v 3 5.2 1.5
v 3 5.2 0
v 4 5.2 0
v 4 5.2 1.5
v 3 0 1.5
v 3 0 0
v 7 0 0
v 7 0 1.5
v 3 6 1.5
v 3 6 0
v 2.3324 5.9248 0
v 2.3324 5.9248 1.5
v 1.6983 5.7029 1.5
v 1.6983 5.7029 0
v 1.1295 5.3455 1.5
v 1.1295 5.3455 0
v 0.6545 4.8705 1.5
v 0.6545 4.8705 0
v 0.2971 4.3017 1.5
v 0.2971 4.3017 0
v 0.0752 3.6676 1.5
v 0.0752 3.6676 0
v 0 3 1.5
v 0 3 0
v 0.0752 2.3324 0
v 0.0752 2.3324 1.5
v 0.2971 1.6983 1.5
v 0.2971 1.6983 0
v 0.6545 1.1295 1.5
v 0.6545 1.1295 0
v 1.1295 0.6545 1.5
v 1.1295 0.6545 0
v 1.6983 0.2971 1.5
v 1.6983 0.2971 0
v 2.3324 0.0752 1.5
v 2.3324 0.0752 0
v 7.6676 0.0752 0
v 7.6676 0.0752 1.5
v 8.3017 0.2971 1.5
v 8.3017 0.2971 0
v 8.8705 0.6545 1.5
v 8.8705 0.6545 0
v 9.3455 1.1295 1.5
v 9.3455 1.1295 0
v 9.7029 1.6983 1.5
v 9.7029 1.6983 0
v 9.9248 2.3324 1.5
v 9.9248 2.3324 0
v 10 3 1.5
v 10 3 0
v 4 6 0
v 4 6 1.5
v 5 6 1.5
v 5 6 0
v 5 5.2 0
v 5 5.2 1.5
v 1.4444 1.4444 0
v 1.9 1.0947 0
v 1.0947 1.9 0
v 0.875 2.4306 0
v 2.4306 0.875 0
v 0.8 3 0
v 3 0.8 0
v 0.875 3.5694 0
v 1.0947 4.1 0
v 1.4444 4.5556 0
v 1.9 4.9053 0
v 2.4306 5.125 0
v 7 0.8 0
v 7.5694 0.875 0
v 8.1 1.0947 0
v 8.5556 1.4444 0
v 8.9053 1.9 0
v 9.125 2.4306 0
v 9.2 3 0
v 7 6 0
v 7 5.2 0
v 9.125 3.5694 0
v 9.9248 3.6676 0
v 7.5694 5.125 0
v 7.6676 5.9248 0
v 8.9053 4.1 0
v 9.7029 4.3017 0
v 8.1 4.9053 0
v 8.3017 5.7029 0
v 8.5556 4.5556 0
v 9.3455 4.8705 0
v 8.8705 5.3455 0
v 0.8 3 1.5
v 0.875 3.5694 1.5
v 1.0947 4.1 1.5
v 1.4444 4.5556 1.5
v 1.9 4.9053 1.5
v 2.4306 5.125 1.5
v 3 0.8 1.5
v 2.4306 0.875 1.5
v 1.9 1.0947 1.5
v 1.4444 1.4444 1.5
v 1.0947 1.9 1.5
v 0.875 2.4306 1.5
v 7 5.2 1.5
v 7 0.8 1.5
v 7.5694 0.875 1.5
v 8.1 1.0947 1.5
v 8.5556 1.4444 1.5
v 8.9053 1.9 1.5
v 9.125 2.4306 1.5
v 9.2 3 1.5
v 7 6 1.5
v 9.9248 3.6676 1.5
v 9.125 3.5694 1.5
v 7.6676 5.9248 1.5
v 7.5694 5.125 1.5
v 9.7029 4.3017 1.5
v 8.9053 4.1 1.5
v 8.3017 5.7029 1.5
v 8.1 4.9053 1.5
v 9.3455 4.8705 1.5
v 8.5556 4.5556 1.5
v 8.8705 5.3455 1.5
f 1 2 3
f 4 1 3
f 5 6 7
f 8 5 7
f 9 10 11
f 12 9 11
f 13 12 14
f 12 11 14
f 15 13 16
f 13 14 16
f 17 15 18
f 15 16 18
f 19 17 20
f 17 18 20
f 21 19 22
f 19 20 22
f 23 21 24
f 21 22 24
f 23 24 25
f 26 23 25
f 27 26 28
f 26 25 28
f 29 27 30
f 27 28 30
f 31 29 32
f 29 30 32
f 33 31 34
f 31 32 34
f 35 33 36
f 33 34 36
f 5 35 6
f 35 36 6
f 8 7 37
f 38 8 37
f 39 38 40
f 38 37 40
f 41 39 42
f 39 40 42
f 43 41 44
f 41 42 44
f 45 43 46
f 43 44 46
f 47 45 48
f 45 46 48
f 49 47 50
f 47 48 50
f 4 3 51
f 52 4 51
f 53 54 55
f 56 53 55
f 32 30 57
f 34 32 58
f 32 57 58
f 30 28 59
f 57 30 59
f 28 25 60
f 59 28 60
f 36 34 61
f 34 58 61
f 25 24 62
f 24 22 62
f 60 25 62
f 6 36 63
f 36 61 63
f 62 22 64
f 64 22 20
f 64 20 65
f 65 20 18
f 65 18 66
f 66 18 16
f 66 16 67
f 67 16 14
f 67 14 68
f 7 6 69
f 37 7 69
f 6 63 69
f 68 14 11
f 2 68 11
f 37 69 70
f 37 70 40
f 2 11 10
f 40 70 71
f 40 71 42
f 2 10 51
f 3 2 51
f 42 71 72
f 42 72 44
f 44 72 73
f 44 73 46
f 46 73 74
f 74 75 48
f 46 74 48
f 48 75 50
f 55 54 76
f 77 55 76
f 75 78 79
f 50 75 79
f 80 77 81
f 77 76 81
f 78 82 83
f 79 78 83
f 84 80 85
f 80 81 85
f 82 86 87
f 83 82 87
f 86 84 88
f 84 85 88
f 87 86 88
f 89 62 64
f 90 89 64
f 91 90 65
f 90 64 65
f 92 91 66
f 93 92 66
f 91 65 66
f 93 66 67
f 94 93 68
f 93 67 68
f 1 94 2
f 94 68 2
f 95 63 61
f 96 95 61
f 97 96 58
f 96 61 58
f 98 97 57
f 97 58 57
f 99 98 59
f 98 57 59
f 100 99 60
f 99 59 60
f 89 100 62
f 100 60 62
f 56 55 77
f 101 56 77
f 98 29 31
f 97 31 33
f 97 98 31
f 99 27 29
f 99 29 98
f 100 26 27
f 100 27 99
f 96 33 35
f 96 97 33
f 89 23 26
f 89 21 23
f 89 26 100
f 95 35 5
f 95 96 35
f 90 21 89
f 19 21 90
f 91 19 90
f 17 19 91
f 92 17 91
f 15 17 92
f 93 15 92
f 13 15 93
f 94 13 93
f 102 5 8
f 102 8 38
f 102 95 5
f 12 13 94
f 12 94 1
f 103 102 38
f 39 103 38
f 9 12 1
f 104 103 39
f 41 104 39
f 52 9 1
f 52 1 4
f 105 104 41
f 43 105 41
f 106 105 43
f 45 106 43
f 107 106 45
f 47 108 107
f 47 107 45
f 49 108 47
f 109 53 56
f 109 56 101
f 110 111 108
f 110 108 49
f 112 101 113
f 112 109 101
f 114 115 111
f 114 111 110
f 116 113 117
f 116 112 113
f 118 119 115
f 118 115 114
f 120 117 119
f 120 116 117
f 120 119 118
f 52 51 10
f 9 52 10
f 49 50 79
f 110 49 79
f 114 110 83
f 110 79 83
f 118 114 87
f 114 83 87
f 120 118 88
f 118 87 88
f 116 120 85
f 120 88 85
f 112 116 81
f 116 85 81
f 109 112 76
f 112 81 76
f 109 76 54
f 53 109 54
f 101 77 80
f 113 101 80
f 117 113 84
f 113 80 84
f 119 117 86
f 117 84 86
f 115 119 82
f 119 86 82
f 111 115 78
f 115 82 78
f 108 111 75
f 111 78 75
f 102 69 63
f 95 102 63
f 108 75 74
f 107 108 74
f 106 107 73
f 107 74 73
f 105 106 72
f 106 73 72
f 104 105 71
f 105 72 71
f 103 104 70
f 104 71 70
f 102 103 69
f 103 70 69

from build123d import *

# Parameters (mm, degrees)
F1_DEPTH = 1.5


with BuildPart() as f1:
    # F0 (on Top) → F1 (new body)
    with BuildSketch(Plane.XY):
        with BuildLine():
            ThreePointArc((0, 3), (0.87868, 0.87868), (3, 0))
            Line((3, 0), (7, 0))
            ThreePointArc((7, 0), (9.12132, 0.87868), (10, 3))
            ThreePointArc((10, 3), (9.12132, 5.12132), (7, 6))
            Line((7, 6), (5, 6))
            Line((5, 6), (5, 5.2))
            Line((5, 5.2), (7, 5.2))
            ThreePointArc((7, 5.2), (8.555635, 4.555635), (9.2, 3))
            ThreePointArc((9.2, 3), (8.555635, 1.444365), (7, 0.8))
            Line((7, 0.8), (3, 0.8))
            ThreePointArc((3, 0.8), (1.444365, 1.444365), (0.8, 3))
            ThreePointArc((0.8, 3), (1.444365, 4.555635), (3, 5.2))
            Line((3, 5.2), (4, 5.2))
            Line((4, 5.2), (4, 6))
            Line((4, 6), (3, 6))
            ThreePointArc((3, 6), (0.87868, 5.12132), (0, 3))
        make_face()
    extrude(amount=F1_DEPTH)


solid = f1.part
